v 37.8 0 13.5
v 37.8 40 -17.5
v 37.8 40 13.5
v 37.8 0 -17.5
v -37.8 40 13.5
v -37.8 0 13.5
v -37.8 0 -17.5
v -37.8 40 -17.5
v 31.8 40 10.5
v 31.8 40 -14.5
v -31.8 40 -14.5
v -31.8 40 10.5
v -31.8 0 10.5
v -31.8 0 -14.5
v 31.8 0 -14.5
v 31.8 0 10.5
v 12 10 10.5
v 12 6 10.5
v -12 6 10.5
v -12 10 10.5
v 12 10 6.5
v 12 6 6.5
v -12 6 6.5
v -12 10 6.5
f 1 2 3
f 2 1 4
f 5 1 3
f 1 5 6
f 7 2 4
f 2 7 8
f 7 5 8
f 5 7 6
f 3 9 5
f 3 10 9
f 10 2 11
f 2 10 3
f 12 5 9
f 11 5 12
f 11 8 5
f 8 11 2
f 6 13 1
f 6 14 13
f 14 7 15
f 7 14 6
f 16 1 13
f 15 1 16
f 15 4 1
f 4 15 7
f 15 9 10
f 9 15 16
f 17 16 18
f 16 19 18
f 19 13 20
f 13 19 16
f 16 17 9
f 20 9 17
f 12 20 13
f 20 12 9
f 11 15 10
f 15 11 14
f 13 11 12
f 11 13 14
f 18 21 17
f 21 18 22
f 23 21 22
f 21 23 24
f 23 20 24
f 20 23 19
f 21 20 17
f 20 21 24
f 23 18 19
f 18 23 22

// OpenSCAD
// Mr Moxey's mint tin holder
// Units: mm. Printer: FDM, PLA.

// ---------------------------------------------------------------------------
// Tin geometry (measured by Tony, 2026-08-06)
// ---------------------------------------------------------------------------

tin_base_length = 96;    // shallow tray half (bottom)
tin_base_width  = 58;
tin_lid_length  = 100;   // overlapping cap half (top) — sets overall envelope
tin_lid_width   = 63;
tin_seam_z      = 10;    // height of the lid/base split, from bottom
tin_total_height = 20;
tin_corner_r    = 13.5;  // plan-view corner radius (avg of measured 12-15mm range)

// Hinge knuckles: PLACEHOLDER geometry — only the protrusion depth was measured.
// Position/width are guesses; adjust hinge_knuckle_* below once you can eyeball
// the real tin, or measure them and I'll fix these.
hinge_protrusion   = 0.75; // beyond the lid's width edge
hinge_side         = 1;    // which long edge: +1 = +X side, -1 = -X side
hinge_knuckle_w    = 8;    // guessed knuckle width along Y
hinge_knuckle_ys   = [12, tin_lid_length - 12]; // guessed knuckle centers along Y

// Fit clearance: PLA on FDM. Added to the total (both-sides) dimension.
// v1 (0.35 both axes) printed too tight: FDM holes commonly print a bit
// undersized, and the real tin runs closer to the top of its tolerance band.
width_clearance  = 0.6;
height_clearance = 1.0; // bumped per v1 test — was very tight at 0.35

// "Lip" = the lid's overhang past the base (tin_lid_width/length vs
// tin_base_width/length). The hinge knuckle pokes out even further past
// the lip on one side — that's what actually blocked the v1 width fit.
// hinge_relief_margin is slop added beyond the measured protrusion.
hinge_relief_margin = 0.5;
hinge_notch_drop    = 1.0; // v2 print: notch caught a little — extend it lower

resolution = 64;

// ---------------------------------------------------------------------------
// Reference tin solid — X = width, Y = length (insertion axis, 0=front),
// Z = height (0 = bottom/base side). For visualization + fit-checking only.
// ---------------------------------------------------------------------------

module rounded_rect(size, r) {
    x = size[0]; y = size[1];
    hull() {
        for (dx = [r, x - r], dy = [r, y - r])
            translate([dx, dy]) circle(r = r, $fn = resolution);
    }
}

module hinge_knuckles(width_env) {
    for (yc = hinge_knuckle_ys)
        translate([hinge_side * (width_env / 2), yc - hinge_knuckle_w / 2, tin_seam_z])
            cube([hinge_protrusion * 2, hinge_knuckle_w, tin_total_height - tin_seam_z]);
}

module tin(clearance = 0) {
    // base (bottom half)
    translate([-tin_base_width / 2 - clearance / 2, (tin_lid_length - tin_base_length) / 2 - clearance / 2, 0])
        linear_extrude(height = tin_seam_z)
            rounded_rect([tin_base_width + clearance, tin_base_length + clearance], tin_corner_r - 2);

    // lid (top half) — also sets the overall footprint
    translate([-tin_lid_width / 2 - clearance / 2, -clearance / 2, tin_seam_z])
        linear_extrude(height = tin_total_height - tin_seam_z)
            rounded_rect([tin_lid_width + clearance, tin_lid_length + clearance], tin_corner_r);

    if (clearance == 0)
        hinge_knuckles(tin_lid_width);
}

// ---------------------------------------------------------------------------
// First print test: a thin plaque with just the front-opening cutout.
// Confirms width/height/corner-radius/clearance fit against the real tin
// before we invest in the full bay + latch geometry.
// ---------------------------------------------------------------------------

frame_thickness = 4;
frame_margin = 10;

function channel_envelope() = [
    tin_lid_width + width_clearance,                                            // 0: w
    tin_total_height + height_clearance,                                        // 1: h
    hinge_protrusion + hinge_relief_margin,                                     // 2: relief_w
    (tin_total_height - tin_seam_z) + height_clearance / 2 + hinge_notch_drop,  // 3: lid_band_h
];

module opening_profile() {
    e = channel_envelope();
    w = e[0]; h = e[1]; relief_w = e[2]; lid_band_h = e[3];

    union() {
        translate([-w / 2, -h / 2]) square([w, h]);
        // hinge relief notch, both sides, upper (lid) band only — so the
        // tin can be inserted with the hinge on either side. The tin gets
        // pushed all the way through this plaque, so the knuckle needs
        // clearance to pass even though it's not centered here.
        translate([w / 2, h / 2 - lid_band_h]) square([relief_w, lid_band_h]);
        translate([-w / 2 - relief_w, h / 2 - lid_band_h]) square([relief_w, lid_band_h]);
    }
    // square corners for now — the front opening's vertical corners were
    // reported sharp, so no radius applied here. Revisit if the real tin
    // proves otherwise against this test piece.
}

module fit_test_frame() {
    w = tin_lid_width + width_clearance + (hinge_protrusion + hinge_relief_margin) * 2 + frame_margin * 2;
    h = tin_total_height + height_clearance + frame_margin * 2;
    linear_extrude(height = frame_thickness)
        difference() {
            translate([-w / 2, -h / 2]) square([w, h]);
            opening_profile();
        }
}

// ---------------------------------------------------------------------------
// Single bay cavity — no latch yet. Validates the full-depth slide fit and
// depth/backstop sizing before the push-push latch (prototyped separately)
// gets integrated.
//
// The channel cross-section is constant along the insertion axis (same
// rectangle as the validated frame test, plus the hinge relief). Since the
// tin's base half (58mm) is narrower than its lid half (63mm), the base
// naturally floats clear of the channel walls and only the lid band makes
// contact — so this already behaves like Tony's "rails on the lip" idea
// without needing a separate stepped-channel feature.
// ---------------------------------------------------------------------------

wall_side        = 3;  // side wall thickness
wall_top_bottom  = 3;  // wall thickness above/below the channel
backstop_thickness = 3;
insertion_extra  = 5;  // slack past tin_lid_length before the backstop —
                        // room to fully seat the tin + future latch mechanism

bay_channel_depth = tin_lid_length + insertion_extra;
bay_total_depth   = bay_channel_depth + backstop_thickness;

module bay_channel(depth) {
    e = channel_envelope();
    w = e[0]; h = e[1]; relief_w = e[2]; lid_band_h = e[3];
    union() {
        translate([-w / 2, -0.5, -h / 2])
            cube([w, depth + 0.5, h]);
        translate([w / 2, -0.5, h / 2 - lid_band_h])
            cube([relief_w, depth + 0.5, lid_band_h]);
        translate([-w / 2 - relief_w, -0.5, h / 2 - lid_band_h])
            cube([relief_w, depth + 0.5, lid_band_h]);
    }
}

module bay_housing() {
    e = channel_envelope();
    w = e[0]; h = e[1]; relief_w = e[2];
    ow = w + relief_w * 2 + wall_side * 2; // relief now on both sides
    oh = h + wall_top_bottom * 2;

    difference() {
        translate([-ow / 2, 0, -oh / 2])
            cube([ow, bay_total_depth, oh]);
        bay_channel(bay_channel_depth);
    }
}

// ---------------------------------------------------------------------------
// N-bay array — shared dividers between adjacent bays instead of printing
// bay_count separate housings side by side. Each bay's own hinge-relief
// notches are accounted for within its own unit width, so the wall_side
// divider between two bays stays fully solid — relief never eats into it.
// No latch yet; this only validates the shared-wall array layout.
// ---------------------------------------------------------------------------

bay_count = 4; // 4 / 6 / 8, per Tony's target range

// Segment-joint tongue/groove — alignment only, not a structural fastener.
// Sized to sit in the bottom wall band (wall_top_bottom) without needing
// to thicken the walls. Tony's plan: glue for the permanent bond.
joint_tongue_d  = 1.5; // protrusion depth
joint_tongue_h  = 2.2; // cross-section height, fits in the 3mm wall band
joint_clearance = 0.3; // per-side groove oversize for a slide fit
joint_margin_y  = 6;   // inset from the front/back edges

module bay_array(n, left_joint = false, right_joint = false) {
    e = channel_envelope();
    w = e[0]; h = e[1]; relief_w = e[2];
    unit_w = w + relief_w * 2;
    oh = h + wall_top_bottom * 2;
    ow = n * unit_w + (n + 1) * wall_side;

    tongue_z = -oh / 2 + wall_top_bottom / 2;
    y0 = joint_margin_y;
    y1 = bay_total_depth - joint_margin_y;

    difference() {
        union() {
            translate([-ow / 2, 0, -oh / 2])
                cube([ow, bay_total_depth, oh]);
            if (right_joint)
                translate([ow / 2, y0, tongue_z - joint_tongue_h / 2])
                    cube([joint_tongue_d, y1 - y0, joint_tongue_h]);
        }
        for (i = [0 : n - 1]) {
            center_x = -ow / 2 + wall_side + unit_w / 2 + i * (unit_w + wall_side);
            translate([center_x, 0, 0])
                bay_channel(bay_channel_depth);
        }
        if (left_joint)
            translate([-ow / 2 - 0.5, y0 - joint_clearance, tongue_z - joint_tongue_h / 2 - joint_clearance])
                cube([joint_tongue_d + joint_clearance + 0.5, (y1 - y0) + joint_clearance * 2, joint_tongue_h + joint_clearance * 2]);
    }
}

// ---------------------------------------------------------------------------
// Segment splitting — a 6-8 bay array is wider than most FDM beds (an
// 8-bay array is ~556mm long). max_segment_width caps each printable piece
// at a safe width for a ~250-300mm bed. bay_segment_sizes() spreads
// bay_count as evenly as possible across the needed number of segments.
//
// NOTE: segments currently butt together with plain flat faces — no
// alignment or fastening feature yet (no tongue/groove, no bolts). That's
// a deliberate placeholder pending a decision on how Tony wants to join
// them (glue / screws+captive nuts / printed dovetail) rather than a
// guess baked into the geometry now.
// ---------------------------------------------------------------------------

max_segment_width = 240; // conservative for a 250-300mm bed

function bays_per_segment() =
    let (e = channel_envelope(), unit_w = e[0] + e[2] * 2)
    max(1, floor((max_segment_width - wall_side) / (unit_w + wall_side)));

function bay_segment_sizes(n) =
    let (per_seg = bays_per_segment(),
         num_segs = ceil(n / per_seg),
         base = floor(n / num_segs),
         rem = n - base * num_segs)
    [for (i = [0 : num_segs - 1]) base + (i < rem ? 1 : 0)];

function cumsum_gapped(widths, gap, i = 0, acc = 0) =
    i >= len(widths) ? [] :
    concat([acc], cumsum_gapped(widths, gap, i + 1, acc + widths[i] + gap));

module bay_segments_preview(n, gap = 15) {
    sizes = bay_segment_sizes(n);
    e = channel_envelope();
    unit_w = e[0] + e[2] * 2;
    widths = [for (s = sizes) s * unit_w + (s + 1) * wall_side];
    starts = cumsum_gapped(widths, gap);
    total_w = starts[len(starts) - 1] + widths[len(widths) - 1];

    for (i = [0 : len(sizes) - 1])
        translate([starts[i] - total_w / 2, 0, 0])
            bay_array(sizes[i], i > 0, i < len(sizes) - 1);
}

// ---------------------------------------------------------------------------
// Push-push latch — heart-cam groove TOPOLOGY test only. Open-top pocket,
// no cover/slider/spring. Drag a toothpick or paperclip tip through it by
// hand to check the routing actually alternates between the two end
// pockets before committing to the full spring+slider mechanism.
//
// Topology: two dead-end pockets, E (open/rest) and L (locked), each
// connected to a shared junction A by their own channel. The channels
// bend around a triangular keep-out (the "tooth") on their way to a small
// shared pocket B just past A. Which side of the tooth the tool is on
// when it arrives at B is what should determine which pocket it falls
// into next — that routing behavior is the thing we're validating.
// ---------------------------------------------------------------------------

lg_lobe_x     = 6;   // lateral offset of E/L pockets from centerline
lg_rest_y     = 0;   // E (open) pocket position
lg_lock_y     = 12;  // L (locked) pocket position
lg_bottom_y   = 18;  // A junction / tooth center
lg_overtravel = 4;   // extra depth past the tooth, shared pocket B
lg_channel_w  = 4;   // groove width — generous, sized for a toothpick/paperclip
lg_tooth_w    = 7;   // lateral width of the tooth keep-out (must exceed lg_channel_w)
lg_pocket_depth = 3; // groove cut depth
lg_plate_margin = 6;

module capsule(p1, p2, w) {
    hull() {
        translate(p1) circle(d = w, $fn = 32);
        translate(p2) circle(d = w, $fn = 32);
    }
}

function groove_points() =
    let (e  = [lg_lobe_x, lg_rest_y],
         l  = [-lg_lobe_x, lg_lock_y],
         p1 = [lg_tooth_w / 2 + lg_channel_w / 2, lg_bottom_y - 3],
         p2 = [-(lg_tooth_w / 2 + lg_channel_w / 2), lg_bottom_y - 3],
         b  = [0, lg_bottom_y + lg_overtravel])
    [e, l, p1, p2, b];

function groove_plate_dims() = [
    2 * (lg_lobe_x + lg_channel_w) + lg_plate_margin * 2,               // 0: plate_w
    lg_bottom_y + lg_overtravel + lg_channel_w + lg_plate_margin * 2,   // 1: plate_d
];

module groove_maze_profile() {
    pts = groove_points();
    e = pts[0]; l = pts[1]; p1 = pts[2]; p2 = pts[3]; b = pts[4];
    union() {
        capsule(e, p1, lg_channel_w);
        capsule(p1, b, lg_channel_w);
        capsule(l, p2, lg_channel_w);
        capsule(p2, b, lg_channel_w);
        translate(e) circle(d = lg_channel_w + 2, $fn = 32);
        translate(l) circle(d = lg_channel_w + 2, $fn = 32);
    }
}

module latch_groove_test() {
    d = groove_plate_dims();
    plate_w = d[0]; plate_d = d[1];
    plate_thickness = lg_pocket_depth + 2;

    difference() {
        translate([-plate_w / 2, -lg_plate_margin, 0])
            cube([plate_w, plate_d, plate_thickness]);
        translate([0, 0, plate_thickness - lg_pocket_depth])
            linear_extrude(height = lg_pocket_depth + 0.5)
                groove_maze_profile();
    }
}

// ---------------------------------------------------------------------------
// Latch integration — v1 first pass, expect to iterate after a test print.
//
// Key constraint that shapes this whole layout: the tin's solid body sweeps
// through most of the bay's depth as it's pushed in/ejected (its back face
// travels from ~mech_rest_y to ~mech_rest_y+lg_bottom_y). A STATIONARY groove
// plate sitting anywhere in that Y-range, at the tin's own width/height,
// would collide with the tin. Fix: the mechanism lives in its own channel
// BELOW the tin channel (separated by a thin membrane), merging into one
// open channel only once behind Y where the tin can ever reach. A pusher
// tab on the slider's front end pokes up through a slot in the membrane —
// only in the region the tin actually travels — to contact the tin's back
// face. The groove maze itself is carried on the underside of a removable
// bottom cover plate (mating against the flat membrane above it), so no
// extra "groove insert" part is needed.
// ---------------------------------------------------------------------------

mech_rest_y    = tin_lid_length - 4; // 96: tin back face at rest — ~4mm poke past the opening
mech_bar_w     = 6;  mech_bar_h = 6; // rigid slider bar cross-section
mech_rigid_len = 20;                 // guided rigid portion, front face to where the flex tongue starts
mech_tongue_len = 20;                // flexible portion, tongue to pin — long & thin flexes easily, not sustained-load
mech_tongue_w  = 1.6;
mech_pin_d     = lg_channel_w - 0.6; // 3.4 — clearance in the 4mm groove

mech_pusher_w   = 10; mech_pusher_len = 6; // tab poking up through the slot to contact the tin
mech_membrane   = 2;                        // wall separating tin channel from the mechanism band
mech_band_h     = 11;                       // mechanism band height (bar 6 + groove pocket 3 + margin)

mech_Y_E = mech_rest_y + mech_rigid_len + mech_tongue_len; // 136: main-frame Y where groove local E sits

mech_slot_y0 = mech_rest_y - 6;                  // 90: slot/band starts here (margin before rest)
mech_slot_y1 = mech_rest_y + lg_bottom_y + 4;     // 118: slot ends past max-push, with margin

mech_spring_pocket_len = 24; // placeholder — measure your actual spring and adjust
mech_endcap = 3;

function groove_plate_w() = groove_plate_dims()[0];
function groove_plate_d() = groove_plate_dims()[1];
function mech_band_w() = max(groove_plate_w(), mech_bar_w + 4);

function mech_plate_front_y() = mech_Y_E - lg_plate_margin;          // 130
function mech_plate_back_y()  = mech_plate_front_y() + groove_plate_d(); // 168
function mech_total_depth()   = mech_plate_back_y() + mech_spring_pocket_len + mech_endcap; // ~195

function mech_band_top() = -(channel_envelope()[1] / 2) - mech_membrane; // just below the tin channel floor
function mech_band_bot() = mech_band_top() - mech_band_h;

module mech_channel(y0, y1) {
    bw = mech_band_w();
    translate([-bw / 2, y0, mech_band_bot()])
        cube([bw, y1 - y0, mech_band_h]);
}

module mech_slot() {
    translate([-mech_pusher_w / 2, mech_slot_y0, mech_band_top()])
        cube([mech_pusher_w, mech_slot_y1 - mech_slot_y0, mech_membrane + 0.5]);
}

module bay_with_latch() {
    e = channel_envelope();
    w = e[0]; h = e[1];
    ow = w + e[2] * 2 + wall_side * 2;
    oh_thin = h + wall_top_bottom * 2;
    z_top = h / 2 + wall_top_bottom;
    z_bot_thin = -(h / 2 + wall_top_bottom);
    total_depth = mech_total_depth();

    difference() {
        union() {
            translate([-ow / 2, 0, z_bot_thin])
                cube([ow, mech_slot_y0, z_top - z_bot_thin]);
            translate([-ow / 2, mech_slot_y0, mech_band_bot()])
                cube([ow, total_depth - mech_slot_y0, z_top - mech_band_bot()]);
        }
        bay_channel(mech_slot_y1);
        mech_channel(mech_slot_y0, total_depth);
        mech_slot();
    }
}

// Printable slider: rigid bar + pusher tab + flexible tongue + pin +
// pushrod-and-flange for the spring to push against. One piece, PLA flex
// is fine here since the tongue is never under SUSTAINED load (only
// momentarily, while transiting the maze).
module latch_slider() {
    band_mid_z = (mech_band_top() + mech_band_bot()) / 2;

    // rigid bar, spans the pusher tab through to where the tongue begins
    hull() {
        translate([0, mech_pusher_len, band_mid_z])
            cube([mech_bar_w, 0.1, mech_bar_h], center = true);
        translate([0, mech_rigid_len, band_mid_z])
            cube([mech_bar_w, 0.1, mech_bar_h], center = true);
    }
    // pusher tab, pokes up through the slot into the tin channel
    translate([-mech_pusher_w / 2 + 1, 0, band_mid_z - mech_bar_h / 2])
        cube([mech_pusher_w - 2, mech_pusher_len, mech_bar_h / 2 + mech_membrane + 3]);
    // flexible tongue, rigid bar's back end to the pin
    translate([0, mech_rigid_len, band_mid_z])
        linear_extrude(height = mech_tongue_w)
            polygon([
                [-mech_bar_w / 2, 0], [mech_bar_w / 2, 0],
                [mech_pin_d / 2, mech_tongue_len], [-mech_pin_d / 2, mech_tongue_len]
            ]);
    // pin
    translate([0, mech_rigid_len + mech_tongue_len, band_mid_z])
        rotate([0, 90, 0])
            cylinder(d = mech_pin_d, h = mech_tongue_w, $fn = 24);
    // spring seat flange, back of the rigid bar — spring pushes here
    translate([0, mech_rigid_len - 4, band_mid_z])
        cube([mech_bar_w + 4, 3, mech_bar_h + 4], center = true);
}

// Printable bottom cover — carries the groove maze pocket (mating against
// the housing's flat membrane above), plus a flat section over the bar
// guide and spring channel. Screws or glue per Tony's call on the
// segment-joint question; holes aren't modeled yet.
module latch_cover() {
    bw = mech_band_w();
    total_depth = mech_total_depth();
    cover_len = total_depth - mech_slot_y0;
    cover_thickness = 2.5;

    difference() {
        translate([-bw / 2, mech_slot_y0, 0])
            cube([bw, cover_len, cover_thickness]);
        translate([0, mech_Y_E, cover_thickness - lg_pocket_depth])
            linear_extrude(height = lg_pocket_depth + 0.5)
                groove_maze_profile();
    }
}

// ---------------------------------------------------------------------------
// Vertical column — one bay wide, N bays tall, per Tony's correction (tins
// stack vertically, not side by side). Stacking pitch uses each bay's full
// height (including the mechanism band at the back), so bays never
// collide even though the front (pure tin-slide) section is shorter.
// ---------------------------------------------------------------------------

column_count = 4; // 4 / 6 / 8

function bay_oh_tall() = (channel_envelope()[1] / 2 + wall_top_bottom) - mech_band_bot();

module bay_column(n) {
    pitch = bay_oh_tall() + wall_side;
    for (i = [0 : n - 1])
        translate([0, 0, i * pitch])
            bay_with_latch();
}

// ---------------------------------------------------------------------------
// Hook-catch latch — v2 mechanism, much simpler than the heart-cam attempt.
// A fixed hook nub near the opening catches the tin's own front lip (the
// ~2mm step where the lid overhangs the base) when the tin is deliberately
// pressed down; lifting clears the hook so the spring can eject it. This
// test rig is deliberately short — just enough channel to push the real
// tin into and try the catch/lift motion by hand, before committing to a
// full-depth bay. No spring in this test; just validating the hook geometry.
// ---------------------------------------------------------------------------

hook_extra_drop  = 4;  // extra downward play beyond the snug fit — room to press the tin down
hook_protrusion  = 4;  // how far the hook nub reaches down from the ceiling
hook_engage_len  = 4;  // hook length along the insertion axis
hook_width       = 24; // hook width, centered — doesn't need to span the full tin width
hook_y           = 6;  // hook position, near the opening
hook_test_depth  = 40; // just enough to test with the tin's front portion

module hook_test() {
    e = channel_envelope();
    w = e[0]; h = e[1];
    z_top = h / 2;
    z_bot_drop = -h / 2 - hook_extra_drop;

    ow = w + wall_side * 4;
    oh = (z_top - z_bot_drop) + wall_top_bottom * 2;

    difference() {
        translate([-ow / 2, 0, z_bot_drop - wall_top_bottom])
            cube([ow, hook_test_depth, oh]);
        translate([-w / 2, -0.5, z_bot_drop])
            cube([w, hook_test_depth + 1, z_top - z_bot_drop]);
    }
    translate([-hook_width / 2, hook_y, z_top - hook_protrusion])
        cube([hook_width, hook_engage_len, hook_protrusion]);
}

// ---------------------------------------------------------------------------
// Render selection
// ---------------------------------------------------------------------------

mode = "hook_test";
// "tin" | "frame_test" | "bay_test" | "latch_groove_test"
// "bay_array_test" | "bay_segments_preview" | "bay_segment_print" (old horizontal array — superseded)
// "bay_with_latch" | "latch_slider_print" | "latch_cover_print" (v1 heart-cam integration — on hold)
// "bay_column_test" (N-bay vertical stack preview, per column_count)
// "hook_test" (v2 mechanism: hand-test the hook-catch geometry with the real tin)

print_segment_index = 0; // which segment to render for "bay_segment_print"

if (mode == "tin")
    tin();
else if (mode == "frame_test")
    fit_test_frame();
else if (mode == "bay_test")
    bay_housing();
else if (mode == "latch_groove_test")
    latch_groove_test();
else if (mode == "bay_array_test")
    bay_array(bay_count);
else if (mode == "bay_segments_preview")
    bay_segments_preview(bay_count);
else if (mode == "bay_segment_print") {
    seg_sizes = bay_segment_sizes(bay_count);
    bay_array(
        seg_sizes[print_segment_index],
        print_segment_index > 0,
        print_segment_index < len(seg_sizes) - 1
    );
}
else if (mode == "bay_with_latch")
    bay_with_latch();
else if (mode == "latch_slider_print")
    latch_slider();
else if (mode == "latch_cover_print")
    latch_cover();
else if (mode == "bay_column_test")
    bay_column(column_count);
else if (mode == "hook_test")
    hook_test();
